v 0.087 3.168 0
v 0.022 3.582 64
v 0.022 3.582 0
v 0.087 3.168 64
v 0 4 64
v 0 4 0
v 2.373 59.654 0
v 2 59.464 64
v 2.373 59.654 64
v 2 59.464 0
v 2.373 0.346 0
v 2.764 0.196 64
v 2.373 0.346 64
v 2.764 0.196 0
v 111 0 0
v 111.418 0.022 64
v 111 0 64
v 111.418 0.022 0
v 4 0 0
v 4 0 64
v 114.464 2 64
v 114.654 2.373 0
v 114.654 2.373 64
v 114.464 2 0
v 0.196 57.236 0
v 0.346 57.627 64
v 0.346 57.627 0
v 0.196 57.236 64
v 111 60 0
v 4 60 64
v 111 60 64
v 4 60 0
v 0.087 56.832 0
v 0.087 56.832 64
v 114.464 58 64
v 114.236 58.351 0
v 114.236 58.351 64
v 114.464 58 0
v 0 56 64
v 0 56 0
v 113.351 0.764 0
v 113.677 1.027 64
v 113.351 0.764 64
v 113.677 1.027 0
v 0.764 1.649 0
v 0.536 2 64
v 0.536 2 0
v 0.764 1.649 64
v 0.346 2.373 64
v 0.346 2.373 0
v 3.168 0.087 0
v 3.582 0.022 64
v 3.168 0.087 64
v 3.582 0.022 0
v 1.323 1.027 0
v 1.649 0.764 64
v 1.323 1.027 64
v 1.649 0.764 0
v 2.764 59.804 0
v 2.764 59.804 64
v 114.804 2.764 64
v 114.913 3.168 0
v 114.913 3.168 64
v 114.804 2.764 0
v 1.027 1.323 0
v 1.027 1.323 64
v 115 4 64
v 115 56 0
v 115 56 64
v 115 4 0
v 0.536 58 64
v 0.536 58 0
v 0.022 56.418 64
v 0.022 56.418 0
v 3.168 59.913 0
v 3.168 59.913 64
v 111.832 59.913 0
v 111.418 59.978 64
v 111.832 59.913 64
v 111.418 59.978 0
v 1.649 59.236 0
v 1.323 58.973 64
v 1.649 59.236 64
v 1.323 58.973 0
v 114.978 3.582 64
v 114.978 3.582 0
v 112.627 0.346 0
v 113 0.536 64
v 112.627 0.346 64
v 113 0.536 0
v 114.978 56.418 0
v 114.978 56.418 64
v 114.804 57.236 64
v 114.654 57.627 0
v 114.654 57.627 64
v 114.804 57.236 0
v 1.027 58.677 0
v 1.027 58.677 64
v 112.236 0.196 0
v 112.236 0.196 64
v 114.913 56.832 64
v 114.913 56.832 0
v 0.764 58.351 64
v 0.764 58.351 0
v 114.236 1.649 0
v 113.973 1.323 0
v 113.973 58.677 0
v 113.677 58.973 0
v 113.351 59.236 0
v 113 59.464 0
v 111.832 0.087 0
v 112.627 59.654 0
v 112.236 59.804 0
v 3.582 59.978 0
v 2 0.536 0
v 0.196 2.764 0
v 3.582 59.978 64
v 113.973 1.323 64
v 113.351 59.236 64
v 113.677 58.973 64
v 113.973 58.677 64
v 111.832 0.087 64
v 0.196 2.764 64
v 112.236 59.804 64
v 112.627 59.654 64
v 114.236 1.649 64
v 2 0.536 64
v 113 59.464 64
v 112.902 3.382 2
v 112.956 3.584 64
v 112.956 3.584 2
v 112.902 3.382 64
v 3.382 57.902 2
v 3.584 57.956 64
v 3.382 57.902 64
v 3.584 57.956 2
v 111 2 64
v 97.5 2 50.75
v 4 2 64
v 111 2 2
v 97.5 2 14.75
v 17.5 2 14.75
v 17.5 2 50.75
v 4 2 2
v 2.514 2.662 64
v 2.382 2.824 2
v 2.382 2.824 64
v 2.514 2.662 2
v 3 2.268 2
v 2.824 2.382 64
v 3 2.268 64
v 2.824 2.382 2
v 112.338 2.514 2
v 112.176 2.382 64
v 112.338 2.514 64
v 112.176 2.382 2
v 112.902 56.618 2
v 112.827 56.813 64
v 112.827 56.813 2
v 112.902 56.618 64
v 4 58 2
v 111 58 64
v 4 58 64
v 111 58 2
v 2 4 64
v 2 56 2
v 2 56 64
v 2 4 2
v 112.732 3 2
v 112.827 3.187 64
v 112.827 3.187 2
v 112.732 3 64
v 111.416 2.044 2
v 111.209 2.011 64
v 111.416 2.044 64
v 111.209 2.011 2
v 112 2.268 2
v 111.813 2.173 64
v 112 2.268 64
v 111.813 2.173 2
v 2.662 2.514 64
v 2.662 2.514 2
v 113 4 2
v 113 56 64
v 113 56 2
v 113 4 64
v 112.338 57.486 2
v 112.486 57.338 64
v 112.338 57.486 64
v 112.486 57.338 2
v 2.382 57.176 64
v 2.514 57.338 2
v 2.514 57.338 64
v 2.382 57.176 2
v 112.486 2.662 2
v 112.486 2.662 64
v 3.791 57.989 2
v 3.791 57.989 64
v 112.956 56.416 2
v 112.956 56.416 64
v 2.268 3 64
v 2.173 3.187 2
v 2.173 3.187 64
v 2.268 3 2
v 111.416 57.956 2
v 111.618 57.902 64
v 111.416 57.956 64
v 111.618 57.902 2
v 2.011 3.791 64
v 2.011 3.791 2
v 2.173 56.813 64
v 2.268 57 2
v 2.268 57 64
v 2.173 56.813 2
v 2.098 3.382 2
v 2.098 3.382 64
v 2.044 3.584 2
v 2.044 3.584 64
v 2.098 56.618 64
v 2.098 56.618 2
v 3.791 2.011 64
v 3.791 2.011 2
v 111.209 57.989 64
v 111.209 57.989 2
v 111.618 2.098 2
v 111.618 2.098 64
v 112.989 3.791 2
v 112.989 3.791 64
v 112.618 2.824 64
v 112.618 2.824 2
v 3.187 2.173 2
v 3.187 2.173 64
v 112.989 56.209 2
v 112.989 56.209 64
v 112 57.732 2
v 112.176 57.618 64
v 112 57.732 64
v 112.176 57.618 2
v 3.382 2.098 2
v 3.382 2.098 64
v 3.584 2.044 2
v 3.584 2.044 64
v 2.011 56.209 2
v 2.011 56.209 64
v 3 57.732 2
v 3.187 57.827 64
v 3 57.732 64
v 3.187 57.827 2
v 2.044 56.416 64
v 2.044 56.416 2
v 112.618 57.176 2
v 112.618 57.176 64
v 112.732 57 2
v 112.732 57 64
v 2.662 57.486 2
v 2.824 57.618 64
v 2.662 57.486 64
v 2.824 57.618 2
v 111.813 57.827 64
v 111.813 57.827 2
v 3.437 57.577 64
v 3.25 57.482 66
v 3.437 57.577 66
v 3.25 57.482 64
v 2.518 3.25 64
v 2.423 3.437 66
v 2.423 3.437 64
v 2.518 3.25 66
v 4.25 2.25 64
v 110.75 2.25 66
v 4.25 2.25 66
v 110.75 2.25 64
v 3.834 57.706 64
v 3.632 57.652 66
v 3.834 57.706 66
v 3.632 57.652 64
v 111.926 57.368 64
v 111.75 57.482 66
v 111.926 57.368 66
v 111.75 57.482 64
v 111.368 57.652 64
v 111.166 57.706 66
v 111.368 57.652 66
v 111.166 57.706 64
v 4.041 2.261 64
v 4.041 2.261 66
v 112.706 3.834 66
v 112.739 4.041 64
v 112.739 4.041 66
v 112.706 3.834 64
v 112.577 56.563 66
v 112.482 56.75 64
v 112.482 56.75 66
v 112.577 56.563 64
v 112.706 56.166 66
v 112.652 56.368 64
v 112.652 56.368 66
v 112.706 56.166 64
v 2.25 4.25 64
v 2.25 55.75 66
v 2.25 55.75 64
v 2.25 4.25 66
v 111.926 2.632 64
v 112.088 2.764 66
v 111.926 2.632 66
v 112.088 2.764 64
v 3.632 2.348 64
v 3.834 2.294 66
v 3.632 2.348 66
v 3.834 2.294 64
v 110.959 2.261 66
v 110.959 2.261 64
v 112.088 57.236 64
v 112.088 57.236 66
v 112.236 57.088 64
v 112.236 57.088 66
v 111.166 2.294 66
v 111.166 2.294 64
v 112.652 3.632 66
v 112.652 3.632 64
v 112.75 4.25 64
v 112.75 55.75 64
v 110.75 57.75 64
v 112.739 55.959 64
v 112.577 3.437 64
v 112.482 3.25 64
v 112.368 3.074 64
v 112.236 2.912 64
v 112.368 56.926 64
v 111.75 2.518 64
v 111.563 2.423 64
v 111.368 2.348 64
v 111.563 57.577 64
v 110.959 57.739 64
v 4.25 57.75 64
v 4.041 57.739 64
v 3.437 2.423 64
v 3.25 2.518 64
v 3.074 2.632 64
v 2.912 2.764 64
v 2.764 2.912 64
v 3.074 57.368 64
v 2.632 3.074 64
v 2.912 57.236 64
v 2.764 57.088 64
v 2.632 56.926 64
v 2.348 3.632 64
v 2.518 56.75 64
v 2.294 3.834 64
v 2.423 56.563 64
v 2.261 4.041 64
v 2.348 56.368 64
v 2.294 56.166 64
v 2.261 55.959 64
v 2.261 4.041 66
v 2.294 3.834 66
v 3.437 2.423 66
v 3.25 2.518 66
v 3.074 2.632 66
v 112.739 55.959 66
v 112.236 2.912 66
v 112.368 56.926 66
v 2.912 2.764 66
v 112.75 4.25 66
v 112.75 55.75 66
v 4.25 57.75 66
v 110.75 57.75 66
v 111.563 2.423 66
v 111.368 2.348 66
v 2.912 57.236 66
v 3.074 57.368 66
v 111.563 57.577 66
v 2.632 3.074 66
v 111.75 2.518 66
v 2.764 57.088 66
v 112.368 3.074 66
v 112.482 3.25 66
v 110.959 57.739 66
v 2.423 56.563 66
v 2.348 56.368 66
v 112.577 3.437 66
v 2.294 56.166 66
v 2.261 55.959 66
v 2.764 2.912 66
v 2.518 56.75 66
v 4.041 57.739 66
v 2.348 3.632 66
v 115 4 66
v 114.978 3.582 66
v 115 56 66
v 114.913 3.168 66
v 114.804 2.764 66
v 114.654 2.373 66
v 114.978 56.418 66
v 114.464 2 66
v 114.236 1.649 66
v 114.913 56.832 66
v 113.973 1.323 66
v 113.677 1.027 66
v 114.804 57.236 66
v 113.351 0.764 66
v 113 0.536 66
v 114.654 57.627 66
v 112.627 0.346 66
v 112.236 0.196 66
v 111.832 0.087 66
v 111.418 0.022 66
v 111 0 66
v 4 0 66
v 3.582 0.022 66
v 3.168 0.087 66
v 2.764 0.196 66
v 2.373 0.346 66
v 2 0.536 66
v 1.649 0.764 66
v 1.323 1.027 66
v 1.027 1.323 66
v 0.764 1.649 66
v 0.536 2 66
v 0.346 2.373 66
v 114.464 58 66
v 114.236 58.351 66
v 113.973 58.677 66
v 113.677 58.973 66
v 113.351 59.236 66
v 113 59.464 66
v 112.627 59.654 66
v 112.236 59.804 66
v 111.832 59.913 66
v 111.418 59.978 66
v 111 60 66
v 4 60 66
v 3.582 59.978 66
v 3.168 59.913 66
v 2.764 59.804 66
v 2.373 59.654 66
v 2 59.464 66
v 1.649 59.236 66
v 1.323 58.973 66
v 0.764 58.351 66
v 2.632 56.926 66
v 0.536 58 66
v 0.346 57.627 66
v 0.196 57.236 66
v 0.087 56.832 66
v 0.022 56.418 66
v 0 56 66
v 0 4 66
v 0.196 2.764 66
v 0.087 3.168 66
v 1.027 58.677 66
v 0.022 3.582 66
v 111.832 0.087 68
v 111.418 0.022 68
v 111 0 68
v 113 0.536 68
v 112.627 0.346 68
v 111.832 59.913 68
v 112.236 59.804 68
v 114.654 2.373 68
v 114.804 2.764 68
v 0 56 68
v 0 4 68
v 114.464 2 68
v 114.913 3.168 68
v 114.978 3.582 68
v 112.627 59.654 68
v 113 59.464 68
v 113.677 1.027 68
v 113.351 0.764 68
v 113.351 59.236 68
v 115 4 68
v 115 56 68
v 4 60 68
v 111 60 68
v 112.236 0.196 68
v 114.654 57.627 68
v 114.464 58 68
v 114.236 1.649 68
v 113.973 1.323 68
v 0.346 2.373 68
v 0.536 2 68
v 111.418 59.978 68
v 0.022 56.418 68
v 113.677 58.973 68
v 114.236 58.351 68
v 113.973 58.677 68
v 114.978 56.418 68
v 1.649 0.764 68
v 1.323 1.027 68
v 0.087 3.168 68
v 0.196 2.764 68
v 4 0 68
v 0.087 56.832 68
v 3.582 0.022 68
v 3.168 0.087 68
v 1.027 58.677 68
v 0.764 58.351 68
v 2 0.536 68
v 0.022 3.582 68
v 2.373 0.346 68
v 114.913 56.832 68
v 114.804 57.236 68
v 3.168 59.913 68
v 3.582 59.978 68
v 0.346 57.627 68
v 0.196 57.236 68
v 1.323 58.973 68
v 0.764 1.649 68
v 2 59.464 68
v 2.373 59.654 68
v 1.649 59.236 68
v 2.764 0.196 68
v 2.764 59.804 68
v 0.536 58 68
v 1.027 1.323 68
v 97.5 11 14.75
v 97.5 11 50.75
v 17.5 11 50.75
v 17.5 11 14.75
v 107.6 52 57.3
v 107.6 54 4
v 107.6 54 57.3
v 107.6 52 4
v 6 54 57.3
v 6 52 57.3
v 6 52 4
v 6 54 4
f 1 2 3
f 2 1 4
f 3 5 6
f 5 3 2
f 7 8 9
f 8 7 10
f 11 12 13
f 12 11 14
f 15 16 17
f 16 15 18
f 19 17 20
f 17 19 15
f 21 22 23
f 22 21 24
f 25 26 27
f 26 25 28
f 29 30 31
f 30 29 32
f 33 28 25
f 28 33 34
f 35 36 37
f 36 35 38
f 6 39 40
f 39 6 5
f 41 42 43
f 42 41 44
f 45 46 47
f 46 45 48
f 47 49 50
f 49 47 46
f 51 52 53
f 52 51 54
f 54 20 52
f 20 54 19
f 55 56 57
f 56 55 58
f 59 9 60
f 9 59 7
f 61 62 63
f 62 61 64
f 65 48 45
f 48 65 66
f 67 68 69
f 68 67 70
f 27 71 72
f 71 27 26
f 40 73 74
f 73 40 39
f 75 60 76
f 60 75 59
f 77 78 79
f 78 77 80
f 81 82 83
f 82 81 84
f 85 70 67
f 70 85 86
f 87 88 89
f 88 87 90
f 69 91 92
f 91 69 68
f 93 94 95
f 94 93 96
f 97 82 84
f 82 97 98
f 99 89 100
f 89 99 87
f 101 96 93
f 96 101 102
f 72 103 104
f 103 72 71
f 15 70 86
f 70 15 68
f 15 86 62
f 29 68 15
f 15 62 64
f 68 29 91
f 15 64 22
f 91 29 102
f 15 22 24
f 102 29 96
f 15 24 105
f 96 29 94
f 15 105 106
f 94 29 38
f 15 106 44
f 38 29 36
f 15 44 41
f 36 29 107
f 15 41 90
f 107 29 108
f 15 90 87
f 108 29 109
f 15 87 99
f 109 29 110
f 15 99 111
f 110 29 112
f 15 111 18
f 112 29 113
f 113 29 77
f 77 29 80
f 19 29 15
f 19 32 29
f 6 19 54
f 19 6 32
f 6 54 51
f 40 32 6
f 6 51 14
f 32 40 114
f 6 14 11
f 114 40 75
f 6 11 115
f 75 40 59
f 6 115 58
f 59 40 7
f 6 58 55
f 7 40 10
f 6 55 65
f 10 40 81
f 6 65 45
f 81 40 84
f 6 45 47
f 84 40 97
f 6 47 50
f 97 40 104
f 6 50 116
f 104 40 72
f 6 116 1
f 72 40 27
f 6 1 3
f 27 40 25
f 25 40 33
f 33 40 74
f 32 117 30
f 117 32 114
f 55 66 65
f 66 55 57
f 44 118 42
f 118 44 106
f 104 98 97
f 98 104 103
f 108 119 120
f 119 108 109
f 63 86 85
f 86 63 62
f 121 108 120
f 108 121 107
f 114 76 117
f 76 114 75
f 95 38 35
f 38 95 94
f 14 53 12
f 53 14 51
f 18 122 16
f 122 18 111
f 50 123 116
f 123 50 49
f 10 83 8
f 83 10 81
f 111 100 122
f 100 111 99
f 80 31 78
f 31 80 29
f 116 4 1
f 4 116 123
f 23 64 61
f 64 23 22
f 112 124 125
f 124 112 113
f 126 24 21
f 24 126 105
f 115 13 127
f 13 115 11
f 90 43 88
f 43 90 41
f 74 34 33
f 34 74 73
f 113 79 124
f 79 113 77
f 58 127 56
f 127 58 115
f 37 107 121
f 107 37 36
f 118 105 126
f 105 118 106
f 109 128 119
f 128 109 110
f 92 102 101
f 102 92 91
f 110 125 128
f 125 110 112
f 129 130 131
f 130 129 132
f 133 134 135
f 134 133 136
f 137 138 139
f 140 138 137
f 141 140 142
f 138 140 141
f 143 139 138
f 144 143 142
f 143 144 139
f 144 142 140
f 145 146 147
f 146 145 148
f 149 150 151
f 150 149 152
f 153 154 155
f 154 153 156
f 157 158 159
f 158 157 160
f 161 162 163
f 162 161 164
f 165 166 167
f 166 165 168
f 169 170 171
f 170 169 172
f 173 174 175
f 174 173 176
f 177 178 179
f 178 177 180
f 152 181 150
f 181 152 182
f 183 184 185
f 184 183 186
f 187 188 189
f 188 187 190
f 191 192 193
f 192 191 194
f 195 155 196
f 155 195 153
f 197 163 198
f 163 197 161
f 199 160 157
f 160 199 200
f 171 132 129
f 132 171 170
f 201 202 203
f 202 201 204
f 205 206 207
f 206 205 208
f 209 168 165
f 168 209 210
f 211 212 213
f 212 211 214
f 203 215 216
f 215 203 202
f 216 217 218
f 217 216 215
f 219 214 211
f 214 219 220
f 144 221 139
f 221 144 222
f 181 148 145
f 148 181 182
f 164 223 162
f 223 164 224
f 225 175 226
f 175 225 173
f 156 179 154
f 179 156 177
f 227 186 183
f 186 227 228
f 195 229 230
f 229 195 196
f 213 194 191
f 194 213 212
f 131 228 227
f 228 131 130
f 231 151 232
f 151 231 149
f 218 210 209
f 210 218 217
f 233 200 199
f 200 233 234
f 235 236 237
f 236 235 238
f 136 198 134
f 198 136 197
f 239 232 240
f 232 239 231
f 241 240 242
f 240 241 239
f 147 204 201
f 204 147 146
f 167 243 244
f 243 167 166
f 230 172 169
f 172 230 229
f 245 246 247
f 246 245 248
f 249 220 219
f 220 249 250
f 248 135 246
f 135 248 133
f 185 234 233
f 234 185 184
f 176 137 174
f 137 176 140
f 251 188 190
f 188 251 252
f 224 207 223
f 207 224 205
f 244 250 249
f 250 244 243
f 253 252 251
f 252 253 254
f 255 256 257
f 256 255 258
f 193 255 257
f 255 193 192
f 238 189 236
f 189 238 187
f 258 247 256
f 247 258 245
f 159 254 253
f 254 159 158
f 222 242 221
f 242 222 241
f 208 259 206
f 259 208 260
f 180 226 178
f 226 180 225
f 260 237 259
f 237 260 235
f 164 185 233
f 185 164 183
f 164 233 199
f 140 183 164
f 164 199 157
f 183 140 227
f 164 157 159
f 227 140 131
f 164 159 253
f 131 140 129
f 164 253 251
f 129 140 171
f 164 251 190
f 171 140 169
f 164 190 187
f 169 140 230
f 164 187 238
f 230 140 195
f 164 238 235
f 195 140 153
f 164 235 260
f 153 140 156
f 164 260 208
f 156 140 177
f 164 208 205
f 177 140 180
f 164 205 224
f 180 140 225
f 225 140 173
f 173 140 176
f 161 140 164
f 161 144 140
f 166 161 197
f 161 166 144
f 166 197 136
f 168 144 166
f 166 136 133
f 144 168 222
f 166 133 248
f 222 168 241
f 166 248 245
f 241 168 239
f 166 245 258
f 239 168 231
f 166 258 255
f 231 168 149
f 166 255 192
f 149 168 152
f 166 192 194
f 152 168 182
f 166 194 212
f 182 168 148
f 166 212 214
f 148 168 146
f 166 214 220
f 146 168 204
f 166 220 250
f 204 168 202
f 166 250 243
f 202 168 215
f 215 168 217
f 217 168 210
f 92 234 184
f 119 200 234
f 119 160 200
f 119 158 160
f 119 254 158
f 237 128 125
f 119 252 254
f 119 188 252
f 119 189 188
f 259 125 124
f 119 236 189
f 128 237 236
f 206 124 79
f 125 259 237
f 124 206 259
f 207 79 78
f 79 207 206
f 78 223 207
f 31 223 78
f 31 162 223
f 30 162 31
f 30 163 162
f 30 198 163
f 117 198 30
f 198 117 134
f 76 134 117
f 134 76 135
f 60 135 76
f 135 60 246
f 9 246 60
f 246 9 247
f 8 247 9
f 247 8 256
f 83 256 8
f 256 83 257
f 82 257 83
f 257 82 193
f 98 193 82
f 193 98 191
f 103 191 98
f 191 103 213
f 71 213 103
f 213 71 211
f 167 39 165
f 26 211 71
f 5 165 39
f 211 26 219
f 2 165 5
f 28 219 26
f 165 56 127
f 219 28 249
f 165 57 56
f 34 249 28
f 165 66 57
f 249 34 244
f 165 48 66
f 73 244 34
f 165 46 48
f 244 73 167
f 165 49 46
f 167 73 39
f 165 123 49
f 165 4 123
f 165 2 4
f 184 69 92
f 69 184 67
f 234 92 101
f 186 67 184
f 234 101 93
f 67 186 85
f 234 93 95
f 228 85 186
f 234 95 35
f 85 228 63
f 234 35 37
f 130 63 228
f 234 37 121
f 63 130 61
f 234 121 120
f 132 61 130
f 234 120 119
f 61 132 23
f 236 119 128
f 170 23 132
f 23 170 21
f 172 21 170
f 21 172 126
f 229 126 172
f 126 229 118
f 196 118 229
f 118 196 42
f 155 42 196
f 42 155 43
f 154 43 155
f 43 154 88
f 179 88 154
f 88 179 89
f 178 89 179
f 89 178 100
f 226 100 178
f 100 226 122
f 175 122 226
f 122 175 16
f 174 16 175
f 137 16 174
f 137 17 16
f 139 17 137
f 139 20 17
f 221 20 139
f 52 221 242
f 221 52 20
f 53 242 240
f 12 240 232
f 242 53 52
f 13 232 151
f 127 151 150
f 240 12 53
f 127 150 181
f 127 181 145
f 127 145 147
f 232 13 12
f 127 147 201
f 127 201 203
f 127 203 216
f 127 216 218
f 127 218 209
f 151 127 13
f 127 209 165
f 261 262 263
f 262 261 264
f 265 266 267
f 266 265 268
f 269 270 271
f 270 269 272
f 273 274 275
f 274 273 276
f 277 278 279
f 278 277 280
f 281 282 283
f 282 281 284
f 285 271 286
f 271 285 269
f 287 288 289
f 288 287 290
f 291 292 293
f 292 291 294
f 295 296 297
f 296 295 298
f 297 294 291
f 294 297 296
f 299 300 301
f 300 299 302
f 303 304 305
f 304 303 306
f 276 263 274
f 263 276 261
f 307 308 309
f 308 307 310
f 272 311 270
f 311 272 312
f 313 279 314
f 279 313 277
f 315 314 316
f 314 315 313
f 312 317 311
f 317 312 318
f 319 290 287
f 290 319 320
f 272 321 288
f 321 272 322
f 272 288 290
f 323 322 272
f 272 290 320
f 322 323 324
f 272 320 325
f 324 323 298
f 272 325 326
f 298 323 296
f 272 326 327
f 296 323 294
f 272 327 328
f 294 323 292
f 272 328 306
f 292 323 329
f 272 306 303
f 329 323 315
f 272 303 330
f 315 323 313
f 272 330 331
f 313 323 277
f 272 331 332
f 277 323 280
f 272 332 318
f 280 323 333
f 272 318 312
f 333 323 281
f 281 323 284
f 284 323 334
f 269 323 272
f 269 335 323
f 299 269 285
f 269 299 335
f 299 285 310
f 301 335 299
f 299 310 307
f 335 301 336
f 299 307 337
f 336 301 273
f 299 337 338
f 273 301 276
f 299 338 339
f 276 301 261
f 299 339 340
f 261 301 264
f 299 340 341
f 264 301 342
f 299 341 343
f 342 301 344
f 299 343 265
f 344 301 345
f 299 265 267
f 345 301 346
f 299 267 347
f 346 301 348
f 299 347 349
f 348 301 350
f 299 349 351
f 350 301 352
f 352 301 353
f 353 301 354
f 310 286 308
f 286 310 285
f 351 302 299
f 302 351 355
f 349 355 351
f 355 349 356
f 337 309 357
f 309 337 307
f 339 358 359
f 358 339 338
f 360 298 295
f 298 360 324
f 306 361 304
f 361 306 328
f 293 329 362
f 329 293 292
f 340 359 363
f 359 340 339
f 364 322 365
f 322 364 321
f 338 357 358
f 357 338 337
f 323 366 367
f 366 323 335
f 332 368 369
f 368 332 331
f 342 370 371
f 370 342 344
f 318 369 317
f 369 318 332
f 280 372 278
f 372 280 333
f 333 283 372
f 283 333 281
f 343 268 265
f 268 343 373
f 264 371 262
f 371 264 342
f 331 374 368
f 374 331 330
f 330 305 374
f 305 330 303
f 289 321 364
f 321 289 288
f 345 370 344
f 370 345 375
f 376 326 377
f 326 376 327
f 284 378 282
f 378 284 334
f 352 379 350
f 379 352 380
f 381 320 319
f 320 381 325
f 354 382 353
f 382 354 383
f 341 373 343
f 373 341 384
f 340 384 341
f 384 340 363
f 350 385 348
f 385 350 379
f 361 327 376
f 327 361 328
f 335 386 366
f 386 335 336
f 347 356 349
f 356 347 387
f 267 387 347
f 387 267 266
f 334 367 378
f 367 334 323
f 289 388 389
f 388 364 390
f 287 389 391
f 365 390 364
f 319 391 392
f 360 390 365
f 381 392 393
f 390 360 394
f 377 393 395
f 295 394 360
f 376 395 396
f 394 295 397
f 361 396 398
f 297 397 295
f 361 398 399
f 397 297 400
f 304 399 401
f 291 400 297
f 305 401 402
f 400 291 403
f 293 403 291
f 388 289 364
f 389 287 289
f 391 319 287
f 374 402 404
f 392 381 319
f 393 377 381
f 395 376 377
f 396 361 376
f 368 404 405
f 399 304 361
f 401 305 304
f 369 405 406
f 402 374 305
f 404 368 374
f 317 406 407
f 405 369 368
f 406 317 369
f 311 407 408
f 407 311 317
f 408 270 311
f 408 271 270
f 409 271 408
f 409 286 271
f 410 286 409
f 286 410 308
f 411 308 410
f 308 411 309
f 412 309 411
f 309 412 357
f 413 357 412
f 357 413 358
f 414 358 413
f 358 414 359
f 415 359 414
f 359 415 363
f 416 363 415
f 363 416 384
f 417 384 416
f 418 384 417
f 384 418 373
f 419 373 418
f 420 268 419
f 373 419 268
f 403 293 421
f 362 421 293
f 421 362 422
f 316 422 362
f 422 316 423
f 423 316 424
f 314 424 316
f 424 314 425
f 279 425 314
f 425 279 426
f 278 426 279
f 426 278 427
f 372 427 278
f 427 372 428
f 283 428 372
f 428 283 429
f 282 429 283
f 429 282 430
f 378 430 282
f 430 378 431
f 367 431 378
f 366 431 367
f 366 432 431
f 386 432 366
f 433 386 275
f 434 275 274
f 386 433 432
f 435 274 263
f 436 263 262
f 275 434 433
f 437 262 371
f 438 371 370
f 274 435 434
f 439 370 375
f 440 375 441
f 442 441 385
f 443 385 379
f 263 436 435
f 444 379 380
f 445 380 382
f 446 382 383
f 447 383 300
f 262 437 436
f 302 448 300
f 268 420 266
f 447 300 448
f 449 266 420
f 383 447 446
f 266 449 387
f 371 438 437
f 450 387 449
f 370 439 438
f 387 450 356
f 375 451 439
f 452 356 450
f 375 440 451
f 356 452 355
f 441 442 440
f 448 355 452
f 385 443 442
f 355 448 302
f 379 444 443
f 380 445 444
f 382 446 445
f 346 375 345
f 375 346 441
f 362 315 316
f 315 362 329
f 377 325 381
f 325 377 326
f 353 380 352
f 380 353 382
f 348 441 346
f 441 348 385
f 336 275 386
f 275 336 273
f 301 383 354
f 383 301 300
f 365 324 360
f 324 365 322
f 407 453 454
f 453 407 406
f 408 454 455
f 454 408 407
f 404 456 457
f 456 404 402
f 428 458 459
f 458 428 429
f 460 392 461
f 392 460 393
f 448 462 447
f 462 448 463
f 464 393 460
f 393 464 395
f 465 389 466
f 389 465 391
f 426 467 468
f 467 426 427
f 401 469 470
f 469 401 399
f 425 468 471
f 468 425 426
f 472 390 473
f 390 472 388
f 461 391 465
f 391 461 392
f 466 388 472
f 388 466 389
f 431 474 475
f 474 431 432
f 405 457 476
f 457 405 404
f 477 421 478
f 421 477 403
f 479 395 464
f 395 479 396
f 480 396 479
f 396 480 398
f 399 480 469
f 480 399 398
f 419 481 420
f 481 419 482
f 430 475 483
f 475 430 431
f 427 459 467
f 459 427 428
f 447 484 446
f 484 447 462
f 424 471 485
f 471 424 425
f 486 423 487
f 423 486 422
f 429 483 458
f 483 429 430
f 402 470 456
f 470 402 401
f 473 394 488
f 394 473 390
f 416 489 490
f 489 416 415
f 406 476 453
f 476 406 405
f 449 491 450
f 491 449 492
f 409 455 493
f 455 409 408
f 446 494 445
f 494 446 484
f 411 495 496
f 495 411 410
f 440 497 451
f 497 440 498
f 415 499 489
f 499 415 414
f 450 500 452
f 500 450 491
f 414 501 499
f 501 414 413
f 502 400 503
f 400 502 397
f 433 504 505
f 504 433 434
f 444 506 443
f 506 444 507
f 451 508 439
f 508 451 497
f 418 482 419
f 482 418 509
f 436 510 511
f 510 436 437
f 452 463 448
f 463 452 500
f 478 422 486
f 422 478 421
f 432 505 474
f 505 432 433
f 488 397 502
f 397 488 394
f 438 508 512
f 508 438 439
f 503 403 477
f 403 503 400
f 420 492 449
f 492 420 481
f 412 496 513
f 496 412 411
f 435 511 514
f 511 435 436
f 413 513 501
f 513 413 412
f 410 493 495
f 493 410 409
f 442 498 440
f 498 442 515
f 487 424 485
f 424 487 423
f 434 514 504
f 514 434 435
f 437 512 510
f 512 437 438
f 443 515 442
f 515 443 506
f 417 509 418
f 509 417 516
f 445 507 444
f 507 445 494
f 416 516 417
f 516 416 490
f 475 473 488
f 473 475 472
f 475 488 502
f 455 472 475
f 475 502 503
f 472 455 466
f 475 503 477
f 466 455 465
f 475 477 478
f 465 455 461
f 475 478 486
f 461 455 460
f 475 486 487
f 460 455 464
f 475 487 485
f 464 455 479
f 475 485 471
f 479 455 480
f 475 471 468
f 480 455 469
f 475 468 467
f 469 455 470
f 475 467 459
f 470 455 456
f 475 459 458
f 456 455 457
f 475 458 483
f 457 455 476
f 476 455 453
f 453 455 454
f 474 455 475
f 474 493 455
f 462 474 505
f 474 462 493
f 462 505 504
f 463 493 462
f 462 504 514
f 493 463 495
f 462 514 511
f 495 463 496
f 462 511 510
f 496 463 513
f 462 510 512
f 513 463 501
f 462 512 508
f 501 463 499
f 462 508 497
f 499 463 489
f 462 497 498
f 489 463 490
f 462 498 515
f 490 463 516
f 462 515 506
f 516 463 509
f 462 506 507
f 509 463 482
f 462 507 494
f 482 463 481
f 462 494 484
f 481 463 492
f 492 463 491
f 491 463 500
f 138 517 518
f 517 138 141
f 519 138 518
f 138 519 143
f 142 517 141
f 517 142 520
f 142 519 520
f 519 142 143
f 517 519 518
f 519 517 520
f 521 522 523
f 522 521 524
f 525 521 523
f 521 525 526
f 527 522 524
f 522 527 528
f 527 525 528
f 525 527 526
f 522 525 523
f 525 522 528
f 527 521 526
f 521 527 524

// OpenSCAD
// Arduino HomeMonitor Enclosure v6 (Optimized Sleek Desktop Edition)
// - Dimensions: 115mm (L) x 60mm (W) x 68mm (H)
// - Wall thickness: 2.0mm, rounded vertical corners (r = 4mm)
// - Front: Centered LCD window + 5mm (0.5cm) pin-clearance notch DIRECTLY above the LCD window top edge
// - Left: Single USB cutout centered at Z = 40mm (4.0cm above base, bottom of hole at 3.4cm)

$fn = 60;

/* ===== ENCLOSURE DIMENSIONS ===== */
outer_x = 115.0;
outer_y = 60.0;                 // Slim 60mm depth
outer_z = 68.0;                 // 68mm compact height
wall    = 2.0;                  // 2.0mm wall thickness
corner_r = 4.0;                 // Rounded corners (r = 4mm)
tol     = 0.35;                 // 3D print tolerance
BOX_H   = 64.0;                 // Bottom shell height (Lid = 4.0mm)

/* ===== HELPER: ROUNDED RECTANGLE CUBE ===== */
module rounded_box(dim, r) {
    x = dim[0]; y = dim[1]; z = dim[2];
    hull() {
        translate([r, r, 0]) cylinder(r=r, h=z);
        translate([x - r, r, 0]) cylinder(r=r, h=z);
        translate([r, y - r, 0]) cylinder(r=r, h=z);
        translate([x - r, y - r, 0]) cylinder(r=r, h=z);
    }
}

/* ===== BASE SHELL ===== */
module shell() {
    difference() {
        rounded_box([outer_x, outer_y, outer_z], corner_r);
        // Hollow interior
        translate([wall, wall, wall])
            rounded_box([outer_x - 2*wall, outer_y - 2*wall, outer_z], max(1.0, corner_r - wall));
    }
}

module bottom_box() {
    intersection() {
        shell();
        cube([outer_x, outer_y, BOX_H]);
    }
}

module top_lid() {
    inner_x = outer_x - 2*wall;
    inner_y = outer_y - 2*wall;
    inner_r = max(1.0, corner_r - wall);

    translate([0, 0, BOX_H]) {
        // Inner locating rim (slides into box opening)
        translate([wall + 0.25, wall + 0.25, 0])
            rounded_box([inner_x - 0.5, inner_y - 0.5, outer_z - BOX_H - wall], inner_r);
        // Top plate
        translate([0, 0, outer_z - BOX_H - wall])
            rounded_box([outer_x, outer_y, wall], corner_r);
    }
}

/* ===== FRONT PANEL CUTOUTS (Y = 0) ===== */
LCD_W = 71.5;
LCD_H = 24.5;
LCD_X = (outer_x - LCD_W) / 2;       // 21.75 mm (centered in X)
LCD_Z = (BOX_H - LCD_H) / 2;         // 19.75 mm (centered in Z)

BUTTON_X = 104.0;
BUTTON_Z = LCD_Z + LCD_H / 2;         // Aligned with LCD center
BUTTON_D = 7.2;

// Pin header notch: 48mm wide, exactly 5mm (0.5cm) directly above top edge of LCD
NOTCH_W = 48.0;
NOTCH_H = 5.0;                       // 5mm (0.5cm) height directly above screen cutout

module front_cutouts() {
    // 1. Main LCD glass window
    translate([LCD_X, -1, LCD_Z])
        cube([LCD_W + tol, wall + 2, LCD_H + tol]);

    // 2. 5mm (0.5cm) pin-header notch directly above the LCD window's top edge
    translate([LCD_X - 1, -1, LCD_Z + LCD_H])
        cube([NOTCH_W + tol, wall + 2, NOTCH_H + tol]);

    // 3. Panel button hole
    translate([BUTTON_X, wall + 2, BUTTON_Z])
        rotate([90, 0, 0])
        cylinder(d=BUTTON_D + tol, h=wall + 4);
}

/* ===== LEFT WALL CUTOUTS (X = 0) ===== */
// USB cutout:
// Center: Z = 40.0mm (4.0cm), Y = 44.0mm (4.4cm)
// Bottom edge of hole: Z = 34.0mm (3.4cm from outer base)
// Top edge of hole: Z = 46.0mm (4.6cm from outer base)
USB_Y = 44.0;
USB_Z = 40.0;
USB_W = 14.0;
USB_H = 12.0;

module left_cutouts() {
    translate([-1, USB_Y - USB_W/2, USB_Z - USB_H/2])
        cube([wall + 2, USB_W + tol, USB_H + tol]);
}

/* ===== LIGHTWEIGHT MEGA GUIDE RAIL ===== */
module board_guide() {
    // Slim vertical guide rails on the floor
    translate([wall + 6, outer_y - wall - 7, wall])
        difference() {
            cube([outer_x - 2*wall - 12, 5.0, 4.0]);
            translate([-1, 1.5, 1.5])
                cube([outer_x - 2*wall - 10, 2.0 + tol, 3.0]);
        }
}

/* ===== ASSEMBLY ===== */
module assembled() {
    color("DimGray", 0.9) bottom_box();
    color("SlateGray", 0.85) top_lid();

    // Visual: LCD module (Green)
    color("DarkGreen", 0.7)
        translate([(outer_x - 80)/2, wall, LCD_Z - 5])
        cube([80, 9, 36]);

    // Visual: Vertical Mega (Blue)
    color("DodgerBlue", 0.7)
        translate([wall + 4, outer_y - wall - 6, wall + 2])
        cube([101.6, 2.0, 53.3]);
}

/* ===== EXPORTS ===== */
module print_bottom() {
    difference() {
        union() {
            bottom_box();
            board_guide();
        }
        front_cutouts();
        left_cutouts();
    }
}

module print_top() {
    top_lid();
}

assembled();
